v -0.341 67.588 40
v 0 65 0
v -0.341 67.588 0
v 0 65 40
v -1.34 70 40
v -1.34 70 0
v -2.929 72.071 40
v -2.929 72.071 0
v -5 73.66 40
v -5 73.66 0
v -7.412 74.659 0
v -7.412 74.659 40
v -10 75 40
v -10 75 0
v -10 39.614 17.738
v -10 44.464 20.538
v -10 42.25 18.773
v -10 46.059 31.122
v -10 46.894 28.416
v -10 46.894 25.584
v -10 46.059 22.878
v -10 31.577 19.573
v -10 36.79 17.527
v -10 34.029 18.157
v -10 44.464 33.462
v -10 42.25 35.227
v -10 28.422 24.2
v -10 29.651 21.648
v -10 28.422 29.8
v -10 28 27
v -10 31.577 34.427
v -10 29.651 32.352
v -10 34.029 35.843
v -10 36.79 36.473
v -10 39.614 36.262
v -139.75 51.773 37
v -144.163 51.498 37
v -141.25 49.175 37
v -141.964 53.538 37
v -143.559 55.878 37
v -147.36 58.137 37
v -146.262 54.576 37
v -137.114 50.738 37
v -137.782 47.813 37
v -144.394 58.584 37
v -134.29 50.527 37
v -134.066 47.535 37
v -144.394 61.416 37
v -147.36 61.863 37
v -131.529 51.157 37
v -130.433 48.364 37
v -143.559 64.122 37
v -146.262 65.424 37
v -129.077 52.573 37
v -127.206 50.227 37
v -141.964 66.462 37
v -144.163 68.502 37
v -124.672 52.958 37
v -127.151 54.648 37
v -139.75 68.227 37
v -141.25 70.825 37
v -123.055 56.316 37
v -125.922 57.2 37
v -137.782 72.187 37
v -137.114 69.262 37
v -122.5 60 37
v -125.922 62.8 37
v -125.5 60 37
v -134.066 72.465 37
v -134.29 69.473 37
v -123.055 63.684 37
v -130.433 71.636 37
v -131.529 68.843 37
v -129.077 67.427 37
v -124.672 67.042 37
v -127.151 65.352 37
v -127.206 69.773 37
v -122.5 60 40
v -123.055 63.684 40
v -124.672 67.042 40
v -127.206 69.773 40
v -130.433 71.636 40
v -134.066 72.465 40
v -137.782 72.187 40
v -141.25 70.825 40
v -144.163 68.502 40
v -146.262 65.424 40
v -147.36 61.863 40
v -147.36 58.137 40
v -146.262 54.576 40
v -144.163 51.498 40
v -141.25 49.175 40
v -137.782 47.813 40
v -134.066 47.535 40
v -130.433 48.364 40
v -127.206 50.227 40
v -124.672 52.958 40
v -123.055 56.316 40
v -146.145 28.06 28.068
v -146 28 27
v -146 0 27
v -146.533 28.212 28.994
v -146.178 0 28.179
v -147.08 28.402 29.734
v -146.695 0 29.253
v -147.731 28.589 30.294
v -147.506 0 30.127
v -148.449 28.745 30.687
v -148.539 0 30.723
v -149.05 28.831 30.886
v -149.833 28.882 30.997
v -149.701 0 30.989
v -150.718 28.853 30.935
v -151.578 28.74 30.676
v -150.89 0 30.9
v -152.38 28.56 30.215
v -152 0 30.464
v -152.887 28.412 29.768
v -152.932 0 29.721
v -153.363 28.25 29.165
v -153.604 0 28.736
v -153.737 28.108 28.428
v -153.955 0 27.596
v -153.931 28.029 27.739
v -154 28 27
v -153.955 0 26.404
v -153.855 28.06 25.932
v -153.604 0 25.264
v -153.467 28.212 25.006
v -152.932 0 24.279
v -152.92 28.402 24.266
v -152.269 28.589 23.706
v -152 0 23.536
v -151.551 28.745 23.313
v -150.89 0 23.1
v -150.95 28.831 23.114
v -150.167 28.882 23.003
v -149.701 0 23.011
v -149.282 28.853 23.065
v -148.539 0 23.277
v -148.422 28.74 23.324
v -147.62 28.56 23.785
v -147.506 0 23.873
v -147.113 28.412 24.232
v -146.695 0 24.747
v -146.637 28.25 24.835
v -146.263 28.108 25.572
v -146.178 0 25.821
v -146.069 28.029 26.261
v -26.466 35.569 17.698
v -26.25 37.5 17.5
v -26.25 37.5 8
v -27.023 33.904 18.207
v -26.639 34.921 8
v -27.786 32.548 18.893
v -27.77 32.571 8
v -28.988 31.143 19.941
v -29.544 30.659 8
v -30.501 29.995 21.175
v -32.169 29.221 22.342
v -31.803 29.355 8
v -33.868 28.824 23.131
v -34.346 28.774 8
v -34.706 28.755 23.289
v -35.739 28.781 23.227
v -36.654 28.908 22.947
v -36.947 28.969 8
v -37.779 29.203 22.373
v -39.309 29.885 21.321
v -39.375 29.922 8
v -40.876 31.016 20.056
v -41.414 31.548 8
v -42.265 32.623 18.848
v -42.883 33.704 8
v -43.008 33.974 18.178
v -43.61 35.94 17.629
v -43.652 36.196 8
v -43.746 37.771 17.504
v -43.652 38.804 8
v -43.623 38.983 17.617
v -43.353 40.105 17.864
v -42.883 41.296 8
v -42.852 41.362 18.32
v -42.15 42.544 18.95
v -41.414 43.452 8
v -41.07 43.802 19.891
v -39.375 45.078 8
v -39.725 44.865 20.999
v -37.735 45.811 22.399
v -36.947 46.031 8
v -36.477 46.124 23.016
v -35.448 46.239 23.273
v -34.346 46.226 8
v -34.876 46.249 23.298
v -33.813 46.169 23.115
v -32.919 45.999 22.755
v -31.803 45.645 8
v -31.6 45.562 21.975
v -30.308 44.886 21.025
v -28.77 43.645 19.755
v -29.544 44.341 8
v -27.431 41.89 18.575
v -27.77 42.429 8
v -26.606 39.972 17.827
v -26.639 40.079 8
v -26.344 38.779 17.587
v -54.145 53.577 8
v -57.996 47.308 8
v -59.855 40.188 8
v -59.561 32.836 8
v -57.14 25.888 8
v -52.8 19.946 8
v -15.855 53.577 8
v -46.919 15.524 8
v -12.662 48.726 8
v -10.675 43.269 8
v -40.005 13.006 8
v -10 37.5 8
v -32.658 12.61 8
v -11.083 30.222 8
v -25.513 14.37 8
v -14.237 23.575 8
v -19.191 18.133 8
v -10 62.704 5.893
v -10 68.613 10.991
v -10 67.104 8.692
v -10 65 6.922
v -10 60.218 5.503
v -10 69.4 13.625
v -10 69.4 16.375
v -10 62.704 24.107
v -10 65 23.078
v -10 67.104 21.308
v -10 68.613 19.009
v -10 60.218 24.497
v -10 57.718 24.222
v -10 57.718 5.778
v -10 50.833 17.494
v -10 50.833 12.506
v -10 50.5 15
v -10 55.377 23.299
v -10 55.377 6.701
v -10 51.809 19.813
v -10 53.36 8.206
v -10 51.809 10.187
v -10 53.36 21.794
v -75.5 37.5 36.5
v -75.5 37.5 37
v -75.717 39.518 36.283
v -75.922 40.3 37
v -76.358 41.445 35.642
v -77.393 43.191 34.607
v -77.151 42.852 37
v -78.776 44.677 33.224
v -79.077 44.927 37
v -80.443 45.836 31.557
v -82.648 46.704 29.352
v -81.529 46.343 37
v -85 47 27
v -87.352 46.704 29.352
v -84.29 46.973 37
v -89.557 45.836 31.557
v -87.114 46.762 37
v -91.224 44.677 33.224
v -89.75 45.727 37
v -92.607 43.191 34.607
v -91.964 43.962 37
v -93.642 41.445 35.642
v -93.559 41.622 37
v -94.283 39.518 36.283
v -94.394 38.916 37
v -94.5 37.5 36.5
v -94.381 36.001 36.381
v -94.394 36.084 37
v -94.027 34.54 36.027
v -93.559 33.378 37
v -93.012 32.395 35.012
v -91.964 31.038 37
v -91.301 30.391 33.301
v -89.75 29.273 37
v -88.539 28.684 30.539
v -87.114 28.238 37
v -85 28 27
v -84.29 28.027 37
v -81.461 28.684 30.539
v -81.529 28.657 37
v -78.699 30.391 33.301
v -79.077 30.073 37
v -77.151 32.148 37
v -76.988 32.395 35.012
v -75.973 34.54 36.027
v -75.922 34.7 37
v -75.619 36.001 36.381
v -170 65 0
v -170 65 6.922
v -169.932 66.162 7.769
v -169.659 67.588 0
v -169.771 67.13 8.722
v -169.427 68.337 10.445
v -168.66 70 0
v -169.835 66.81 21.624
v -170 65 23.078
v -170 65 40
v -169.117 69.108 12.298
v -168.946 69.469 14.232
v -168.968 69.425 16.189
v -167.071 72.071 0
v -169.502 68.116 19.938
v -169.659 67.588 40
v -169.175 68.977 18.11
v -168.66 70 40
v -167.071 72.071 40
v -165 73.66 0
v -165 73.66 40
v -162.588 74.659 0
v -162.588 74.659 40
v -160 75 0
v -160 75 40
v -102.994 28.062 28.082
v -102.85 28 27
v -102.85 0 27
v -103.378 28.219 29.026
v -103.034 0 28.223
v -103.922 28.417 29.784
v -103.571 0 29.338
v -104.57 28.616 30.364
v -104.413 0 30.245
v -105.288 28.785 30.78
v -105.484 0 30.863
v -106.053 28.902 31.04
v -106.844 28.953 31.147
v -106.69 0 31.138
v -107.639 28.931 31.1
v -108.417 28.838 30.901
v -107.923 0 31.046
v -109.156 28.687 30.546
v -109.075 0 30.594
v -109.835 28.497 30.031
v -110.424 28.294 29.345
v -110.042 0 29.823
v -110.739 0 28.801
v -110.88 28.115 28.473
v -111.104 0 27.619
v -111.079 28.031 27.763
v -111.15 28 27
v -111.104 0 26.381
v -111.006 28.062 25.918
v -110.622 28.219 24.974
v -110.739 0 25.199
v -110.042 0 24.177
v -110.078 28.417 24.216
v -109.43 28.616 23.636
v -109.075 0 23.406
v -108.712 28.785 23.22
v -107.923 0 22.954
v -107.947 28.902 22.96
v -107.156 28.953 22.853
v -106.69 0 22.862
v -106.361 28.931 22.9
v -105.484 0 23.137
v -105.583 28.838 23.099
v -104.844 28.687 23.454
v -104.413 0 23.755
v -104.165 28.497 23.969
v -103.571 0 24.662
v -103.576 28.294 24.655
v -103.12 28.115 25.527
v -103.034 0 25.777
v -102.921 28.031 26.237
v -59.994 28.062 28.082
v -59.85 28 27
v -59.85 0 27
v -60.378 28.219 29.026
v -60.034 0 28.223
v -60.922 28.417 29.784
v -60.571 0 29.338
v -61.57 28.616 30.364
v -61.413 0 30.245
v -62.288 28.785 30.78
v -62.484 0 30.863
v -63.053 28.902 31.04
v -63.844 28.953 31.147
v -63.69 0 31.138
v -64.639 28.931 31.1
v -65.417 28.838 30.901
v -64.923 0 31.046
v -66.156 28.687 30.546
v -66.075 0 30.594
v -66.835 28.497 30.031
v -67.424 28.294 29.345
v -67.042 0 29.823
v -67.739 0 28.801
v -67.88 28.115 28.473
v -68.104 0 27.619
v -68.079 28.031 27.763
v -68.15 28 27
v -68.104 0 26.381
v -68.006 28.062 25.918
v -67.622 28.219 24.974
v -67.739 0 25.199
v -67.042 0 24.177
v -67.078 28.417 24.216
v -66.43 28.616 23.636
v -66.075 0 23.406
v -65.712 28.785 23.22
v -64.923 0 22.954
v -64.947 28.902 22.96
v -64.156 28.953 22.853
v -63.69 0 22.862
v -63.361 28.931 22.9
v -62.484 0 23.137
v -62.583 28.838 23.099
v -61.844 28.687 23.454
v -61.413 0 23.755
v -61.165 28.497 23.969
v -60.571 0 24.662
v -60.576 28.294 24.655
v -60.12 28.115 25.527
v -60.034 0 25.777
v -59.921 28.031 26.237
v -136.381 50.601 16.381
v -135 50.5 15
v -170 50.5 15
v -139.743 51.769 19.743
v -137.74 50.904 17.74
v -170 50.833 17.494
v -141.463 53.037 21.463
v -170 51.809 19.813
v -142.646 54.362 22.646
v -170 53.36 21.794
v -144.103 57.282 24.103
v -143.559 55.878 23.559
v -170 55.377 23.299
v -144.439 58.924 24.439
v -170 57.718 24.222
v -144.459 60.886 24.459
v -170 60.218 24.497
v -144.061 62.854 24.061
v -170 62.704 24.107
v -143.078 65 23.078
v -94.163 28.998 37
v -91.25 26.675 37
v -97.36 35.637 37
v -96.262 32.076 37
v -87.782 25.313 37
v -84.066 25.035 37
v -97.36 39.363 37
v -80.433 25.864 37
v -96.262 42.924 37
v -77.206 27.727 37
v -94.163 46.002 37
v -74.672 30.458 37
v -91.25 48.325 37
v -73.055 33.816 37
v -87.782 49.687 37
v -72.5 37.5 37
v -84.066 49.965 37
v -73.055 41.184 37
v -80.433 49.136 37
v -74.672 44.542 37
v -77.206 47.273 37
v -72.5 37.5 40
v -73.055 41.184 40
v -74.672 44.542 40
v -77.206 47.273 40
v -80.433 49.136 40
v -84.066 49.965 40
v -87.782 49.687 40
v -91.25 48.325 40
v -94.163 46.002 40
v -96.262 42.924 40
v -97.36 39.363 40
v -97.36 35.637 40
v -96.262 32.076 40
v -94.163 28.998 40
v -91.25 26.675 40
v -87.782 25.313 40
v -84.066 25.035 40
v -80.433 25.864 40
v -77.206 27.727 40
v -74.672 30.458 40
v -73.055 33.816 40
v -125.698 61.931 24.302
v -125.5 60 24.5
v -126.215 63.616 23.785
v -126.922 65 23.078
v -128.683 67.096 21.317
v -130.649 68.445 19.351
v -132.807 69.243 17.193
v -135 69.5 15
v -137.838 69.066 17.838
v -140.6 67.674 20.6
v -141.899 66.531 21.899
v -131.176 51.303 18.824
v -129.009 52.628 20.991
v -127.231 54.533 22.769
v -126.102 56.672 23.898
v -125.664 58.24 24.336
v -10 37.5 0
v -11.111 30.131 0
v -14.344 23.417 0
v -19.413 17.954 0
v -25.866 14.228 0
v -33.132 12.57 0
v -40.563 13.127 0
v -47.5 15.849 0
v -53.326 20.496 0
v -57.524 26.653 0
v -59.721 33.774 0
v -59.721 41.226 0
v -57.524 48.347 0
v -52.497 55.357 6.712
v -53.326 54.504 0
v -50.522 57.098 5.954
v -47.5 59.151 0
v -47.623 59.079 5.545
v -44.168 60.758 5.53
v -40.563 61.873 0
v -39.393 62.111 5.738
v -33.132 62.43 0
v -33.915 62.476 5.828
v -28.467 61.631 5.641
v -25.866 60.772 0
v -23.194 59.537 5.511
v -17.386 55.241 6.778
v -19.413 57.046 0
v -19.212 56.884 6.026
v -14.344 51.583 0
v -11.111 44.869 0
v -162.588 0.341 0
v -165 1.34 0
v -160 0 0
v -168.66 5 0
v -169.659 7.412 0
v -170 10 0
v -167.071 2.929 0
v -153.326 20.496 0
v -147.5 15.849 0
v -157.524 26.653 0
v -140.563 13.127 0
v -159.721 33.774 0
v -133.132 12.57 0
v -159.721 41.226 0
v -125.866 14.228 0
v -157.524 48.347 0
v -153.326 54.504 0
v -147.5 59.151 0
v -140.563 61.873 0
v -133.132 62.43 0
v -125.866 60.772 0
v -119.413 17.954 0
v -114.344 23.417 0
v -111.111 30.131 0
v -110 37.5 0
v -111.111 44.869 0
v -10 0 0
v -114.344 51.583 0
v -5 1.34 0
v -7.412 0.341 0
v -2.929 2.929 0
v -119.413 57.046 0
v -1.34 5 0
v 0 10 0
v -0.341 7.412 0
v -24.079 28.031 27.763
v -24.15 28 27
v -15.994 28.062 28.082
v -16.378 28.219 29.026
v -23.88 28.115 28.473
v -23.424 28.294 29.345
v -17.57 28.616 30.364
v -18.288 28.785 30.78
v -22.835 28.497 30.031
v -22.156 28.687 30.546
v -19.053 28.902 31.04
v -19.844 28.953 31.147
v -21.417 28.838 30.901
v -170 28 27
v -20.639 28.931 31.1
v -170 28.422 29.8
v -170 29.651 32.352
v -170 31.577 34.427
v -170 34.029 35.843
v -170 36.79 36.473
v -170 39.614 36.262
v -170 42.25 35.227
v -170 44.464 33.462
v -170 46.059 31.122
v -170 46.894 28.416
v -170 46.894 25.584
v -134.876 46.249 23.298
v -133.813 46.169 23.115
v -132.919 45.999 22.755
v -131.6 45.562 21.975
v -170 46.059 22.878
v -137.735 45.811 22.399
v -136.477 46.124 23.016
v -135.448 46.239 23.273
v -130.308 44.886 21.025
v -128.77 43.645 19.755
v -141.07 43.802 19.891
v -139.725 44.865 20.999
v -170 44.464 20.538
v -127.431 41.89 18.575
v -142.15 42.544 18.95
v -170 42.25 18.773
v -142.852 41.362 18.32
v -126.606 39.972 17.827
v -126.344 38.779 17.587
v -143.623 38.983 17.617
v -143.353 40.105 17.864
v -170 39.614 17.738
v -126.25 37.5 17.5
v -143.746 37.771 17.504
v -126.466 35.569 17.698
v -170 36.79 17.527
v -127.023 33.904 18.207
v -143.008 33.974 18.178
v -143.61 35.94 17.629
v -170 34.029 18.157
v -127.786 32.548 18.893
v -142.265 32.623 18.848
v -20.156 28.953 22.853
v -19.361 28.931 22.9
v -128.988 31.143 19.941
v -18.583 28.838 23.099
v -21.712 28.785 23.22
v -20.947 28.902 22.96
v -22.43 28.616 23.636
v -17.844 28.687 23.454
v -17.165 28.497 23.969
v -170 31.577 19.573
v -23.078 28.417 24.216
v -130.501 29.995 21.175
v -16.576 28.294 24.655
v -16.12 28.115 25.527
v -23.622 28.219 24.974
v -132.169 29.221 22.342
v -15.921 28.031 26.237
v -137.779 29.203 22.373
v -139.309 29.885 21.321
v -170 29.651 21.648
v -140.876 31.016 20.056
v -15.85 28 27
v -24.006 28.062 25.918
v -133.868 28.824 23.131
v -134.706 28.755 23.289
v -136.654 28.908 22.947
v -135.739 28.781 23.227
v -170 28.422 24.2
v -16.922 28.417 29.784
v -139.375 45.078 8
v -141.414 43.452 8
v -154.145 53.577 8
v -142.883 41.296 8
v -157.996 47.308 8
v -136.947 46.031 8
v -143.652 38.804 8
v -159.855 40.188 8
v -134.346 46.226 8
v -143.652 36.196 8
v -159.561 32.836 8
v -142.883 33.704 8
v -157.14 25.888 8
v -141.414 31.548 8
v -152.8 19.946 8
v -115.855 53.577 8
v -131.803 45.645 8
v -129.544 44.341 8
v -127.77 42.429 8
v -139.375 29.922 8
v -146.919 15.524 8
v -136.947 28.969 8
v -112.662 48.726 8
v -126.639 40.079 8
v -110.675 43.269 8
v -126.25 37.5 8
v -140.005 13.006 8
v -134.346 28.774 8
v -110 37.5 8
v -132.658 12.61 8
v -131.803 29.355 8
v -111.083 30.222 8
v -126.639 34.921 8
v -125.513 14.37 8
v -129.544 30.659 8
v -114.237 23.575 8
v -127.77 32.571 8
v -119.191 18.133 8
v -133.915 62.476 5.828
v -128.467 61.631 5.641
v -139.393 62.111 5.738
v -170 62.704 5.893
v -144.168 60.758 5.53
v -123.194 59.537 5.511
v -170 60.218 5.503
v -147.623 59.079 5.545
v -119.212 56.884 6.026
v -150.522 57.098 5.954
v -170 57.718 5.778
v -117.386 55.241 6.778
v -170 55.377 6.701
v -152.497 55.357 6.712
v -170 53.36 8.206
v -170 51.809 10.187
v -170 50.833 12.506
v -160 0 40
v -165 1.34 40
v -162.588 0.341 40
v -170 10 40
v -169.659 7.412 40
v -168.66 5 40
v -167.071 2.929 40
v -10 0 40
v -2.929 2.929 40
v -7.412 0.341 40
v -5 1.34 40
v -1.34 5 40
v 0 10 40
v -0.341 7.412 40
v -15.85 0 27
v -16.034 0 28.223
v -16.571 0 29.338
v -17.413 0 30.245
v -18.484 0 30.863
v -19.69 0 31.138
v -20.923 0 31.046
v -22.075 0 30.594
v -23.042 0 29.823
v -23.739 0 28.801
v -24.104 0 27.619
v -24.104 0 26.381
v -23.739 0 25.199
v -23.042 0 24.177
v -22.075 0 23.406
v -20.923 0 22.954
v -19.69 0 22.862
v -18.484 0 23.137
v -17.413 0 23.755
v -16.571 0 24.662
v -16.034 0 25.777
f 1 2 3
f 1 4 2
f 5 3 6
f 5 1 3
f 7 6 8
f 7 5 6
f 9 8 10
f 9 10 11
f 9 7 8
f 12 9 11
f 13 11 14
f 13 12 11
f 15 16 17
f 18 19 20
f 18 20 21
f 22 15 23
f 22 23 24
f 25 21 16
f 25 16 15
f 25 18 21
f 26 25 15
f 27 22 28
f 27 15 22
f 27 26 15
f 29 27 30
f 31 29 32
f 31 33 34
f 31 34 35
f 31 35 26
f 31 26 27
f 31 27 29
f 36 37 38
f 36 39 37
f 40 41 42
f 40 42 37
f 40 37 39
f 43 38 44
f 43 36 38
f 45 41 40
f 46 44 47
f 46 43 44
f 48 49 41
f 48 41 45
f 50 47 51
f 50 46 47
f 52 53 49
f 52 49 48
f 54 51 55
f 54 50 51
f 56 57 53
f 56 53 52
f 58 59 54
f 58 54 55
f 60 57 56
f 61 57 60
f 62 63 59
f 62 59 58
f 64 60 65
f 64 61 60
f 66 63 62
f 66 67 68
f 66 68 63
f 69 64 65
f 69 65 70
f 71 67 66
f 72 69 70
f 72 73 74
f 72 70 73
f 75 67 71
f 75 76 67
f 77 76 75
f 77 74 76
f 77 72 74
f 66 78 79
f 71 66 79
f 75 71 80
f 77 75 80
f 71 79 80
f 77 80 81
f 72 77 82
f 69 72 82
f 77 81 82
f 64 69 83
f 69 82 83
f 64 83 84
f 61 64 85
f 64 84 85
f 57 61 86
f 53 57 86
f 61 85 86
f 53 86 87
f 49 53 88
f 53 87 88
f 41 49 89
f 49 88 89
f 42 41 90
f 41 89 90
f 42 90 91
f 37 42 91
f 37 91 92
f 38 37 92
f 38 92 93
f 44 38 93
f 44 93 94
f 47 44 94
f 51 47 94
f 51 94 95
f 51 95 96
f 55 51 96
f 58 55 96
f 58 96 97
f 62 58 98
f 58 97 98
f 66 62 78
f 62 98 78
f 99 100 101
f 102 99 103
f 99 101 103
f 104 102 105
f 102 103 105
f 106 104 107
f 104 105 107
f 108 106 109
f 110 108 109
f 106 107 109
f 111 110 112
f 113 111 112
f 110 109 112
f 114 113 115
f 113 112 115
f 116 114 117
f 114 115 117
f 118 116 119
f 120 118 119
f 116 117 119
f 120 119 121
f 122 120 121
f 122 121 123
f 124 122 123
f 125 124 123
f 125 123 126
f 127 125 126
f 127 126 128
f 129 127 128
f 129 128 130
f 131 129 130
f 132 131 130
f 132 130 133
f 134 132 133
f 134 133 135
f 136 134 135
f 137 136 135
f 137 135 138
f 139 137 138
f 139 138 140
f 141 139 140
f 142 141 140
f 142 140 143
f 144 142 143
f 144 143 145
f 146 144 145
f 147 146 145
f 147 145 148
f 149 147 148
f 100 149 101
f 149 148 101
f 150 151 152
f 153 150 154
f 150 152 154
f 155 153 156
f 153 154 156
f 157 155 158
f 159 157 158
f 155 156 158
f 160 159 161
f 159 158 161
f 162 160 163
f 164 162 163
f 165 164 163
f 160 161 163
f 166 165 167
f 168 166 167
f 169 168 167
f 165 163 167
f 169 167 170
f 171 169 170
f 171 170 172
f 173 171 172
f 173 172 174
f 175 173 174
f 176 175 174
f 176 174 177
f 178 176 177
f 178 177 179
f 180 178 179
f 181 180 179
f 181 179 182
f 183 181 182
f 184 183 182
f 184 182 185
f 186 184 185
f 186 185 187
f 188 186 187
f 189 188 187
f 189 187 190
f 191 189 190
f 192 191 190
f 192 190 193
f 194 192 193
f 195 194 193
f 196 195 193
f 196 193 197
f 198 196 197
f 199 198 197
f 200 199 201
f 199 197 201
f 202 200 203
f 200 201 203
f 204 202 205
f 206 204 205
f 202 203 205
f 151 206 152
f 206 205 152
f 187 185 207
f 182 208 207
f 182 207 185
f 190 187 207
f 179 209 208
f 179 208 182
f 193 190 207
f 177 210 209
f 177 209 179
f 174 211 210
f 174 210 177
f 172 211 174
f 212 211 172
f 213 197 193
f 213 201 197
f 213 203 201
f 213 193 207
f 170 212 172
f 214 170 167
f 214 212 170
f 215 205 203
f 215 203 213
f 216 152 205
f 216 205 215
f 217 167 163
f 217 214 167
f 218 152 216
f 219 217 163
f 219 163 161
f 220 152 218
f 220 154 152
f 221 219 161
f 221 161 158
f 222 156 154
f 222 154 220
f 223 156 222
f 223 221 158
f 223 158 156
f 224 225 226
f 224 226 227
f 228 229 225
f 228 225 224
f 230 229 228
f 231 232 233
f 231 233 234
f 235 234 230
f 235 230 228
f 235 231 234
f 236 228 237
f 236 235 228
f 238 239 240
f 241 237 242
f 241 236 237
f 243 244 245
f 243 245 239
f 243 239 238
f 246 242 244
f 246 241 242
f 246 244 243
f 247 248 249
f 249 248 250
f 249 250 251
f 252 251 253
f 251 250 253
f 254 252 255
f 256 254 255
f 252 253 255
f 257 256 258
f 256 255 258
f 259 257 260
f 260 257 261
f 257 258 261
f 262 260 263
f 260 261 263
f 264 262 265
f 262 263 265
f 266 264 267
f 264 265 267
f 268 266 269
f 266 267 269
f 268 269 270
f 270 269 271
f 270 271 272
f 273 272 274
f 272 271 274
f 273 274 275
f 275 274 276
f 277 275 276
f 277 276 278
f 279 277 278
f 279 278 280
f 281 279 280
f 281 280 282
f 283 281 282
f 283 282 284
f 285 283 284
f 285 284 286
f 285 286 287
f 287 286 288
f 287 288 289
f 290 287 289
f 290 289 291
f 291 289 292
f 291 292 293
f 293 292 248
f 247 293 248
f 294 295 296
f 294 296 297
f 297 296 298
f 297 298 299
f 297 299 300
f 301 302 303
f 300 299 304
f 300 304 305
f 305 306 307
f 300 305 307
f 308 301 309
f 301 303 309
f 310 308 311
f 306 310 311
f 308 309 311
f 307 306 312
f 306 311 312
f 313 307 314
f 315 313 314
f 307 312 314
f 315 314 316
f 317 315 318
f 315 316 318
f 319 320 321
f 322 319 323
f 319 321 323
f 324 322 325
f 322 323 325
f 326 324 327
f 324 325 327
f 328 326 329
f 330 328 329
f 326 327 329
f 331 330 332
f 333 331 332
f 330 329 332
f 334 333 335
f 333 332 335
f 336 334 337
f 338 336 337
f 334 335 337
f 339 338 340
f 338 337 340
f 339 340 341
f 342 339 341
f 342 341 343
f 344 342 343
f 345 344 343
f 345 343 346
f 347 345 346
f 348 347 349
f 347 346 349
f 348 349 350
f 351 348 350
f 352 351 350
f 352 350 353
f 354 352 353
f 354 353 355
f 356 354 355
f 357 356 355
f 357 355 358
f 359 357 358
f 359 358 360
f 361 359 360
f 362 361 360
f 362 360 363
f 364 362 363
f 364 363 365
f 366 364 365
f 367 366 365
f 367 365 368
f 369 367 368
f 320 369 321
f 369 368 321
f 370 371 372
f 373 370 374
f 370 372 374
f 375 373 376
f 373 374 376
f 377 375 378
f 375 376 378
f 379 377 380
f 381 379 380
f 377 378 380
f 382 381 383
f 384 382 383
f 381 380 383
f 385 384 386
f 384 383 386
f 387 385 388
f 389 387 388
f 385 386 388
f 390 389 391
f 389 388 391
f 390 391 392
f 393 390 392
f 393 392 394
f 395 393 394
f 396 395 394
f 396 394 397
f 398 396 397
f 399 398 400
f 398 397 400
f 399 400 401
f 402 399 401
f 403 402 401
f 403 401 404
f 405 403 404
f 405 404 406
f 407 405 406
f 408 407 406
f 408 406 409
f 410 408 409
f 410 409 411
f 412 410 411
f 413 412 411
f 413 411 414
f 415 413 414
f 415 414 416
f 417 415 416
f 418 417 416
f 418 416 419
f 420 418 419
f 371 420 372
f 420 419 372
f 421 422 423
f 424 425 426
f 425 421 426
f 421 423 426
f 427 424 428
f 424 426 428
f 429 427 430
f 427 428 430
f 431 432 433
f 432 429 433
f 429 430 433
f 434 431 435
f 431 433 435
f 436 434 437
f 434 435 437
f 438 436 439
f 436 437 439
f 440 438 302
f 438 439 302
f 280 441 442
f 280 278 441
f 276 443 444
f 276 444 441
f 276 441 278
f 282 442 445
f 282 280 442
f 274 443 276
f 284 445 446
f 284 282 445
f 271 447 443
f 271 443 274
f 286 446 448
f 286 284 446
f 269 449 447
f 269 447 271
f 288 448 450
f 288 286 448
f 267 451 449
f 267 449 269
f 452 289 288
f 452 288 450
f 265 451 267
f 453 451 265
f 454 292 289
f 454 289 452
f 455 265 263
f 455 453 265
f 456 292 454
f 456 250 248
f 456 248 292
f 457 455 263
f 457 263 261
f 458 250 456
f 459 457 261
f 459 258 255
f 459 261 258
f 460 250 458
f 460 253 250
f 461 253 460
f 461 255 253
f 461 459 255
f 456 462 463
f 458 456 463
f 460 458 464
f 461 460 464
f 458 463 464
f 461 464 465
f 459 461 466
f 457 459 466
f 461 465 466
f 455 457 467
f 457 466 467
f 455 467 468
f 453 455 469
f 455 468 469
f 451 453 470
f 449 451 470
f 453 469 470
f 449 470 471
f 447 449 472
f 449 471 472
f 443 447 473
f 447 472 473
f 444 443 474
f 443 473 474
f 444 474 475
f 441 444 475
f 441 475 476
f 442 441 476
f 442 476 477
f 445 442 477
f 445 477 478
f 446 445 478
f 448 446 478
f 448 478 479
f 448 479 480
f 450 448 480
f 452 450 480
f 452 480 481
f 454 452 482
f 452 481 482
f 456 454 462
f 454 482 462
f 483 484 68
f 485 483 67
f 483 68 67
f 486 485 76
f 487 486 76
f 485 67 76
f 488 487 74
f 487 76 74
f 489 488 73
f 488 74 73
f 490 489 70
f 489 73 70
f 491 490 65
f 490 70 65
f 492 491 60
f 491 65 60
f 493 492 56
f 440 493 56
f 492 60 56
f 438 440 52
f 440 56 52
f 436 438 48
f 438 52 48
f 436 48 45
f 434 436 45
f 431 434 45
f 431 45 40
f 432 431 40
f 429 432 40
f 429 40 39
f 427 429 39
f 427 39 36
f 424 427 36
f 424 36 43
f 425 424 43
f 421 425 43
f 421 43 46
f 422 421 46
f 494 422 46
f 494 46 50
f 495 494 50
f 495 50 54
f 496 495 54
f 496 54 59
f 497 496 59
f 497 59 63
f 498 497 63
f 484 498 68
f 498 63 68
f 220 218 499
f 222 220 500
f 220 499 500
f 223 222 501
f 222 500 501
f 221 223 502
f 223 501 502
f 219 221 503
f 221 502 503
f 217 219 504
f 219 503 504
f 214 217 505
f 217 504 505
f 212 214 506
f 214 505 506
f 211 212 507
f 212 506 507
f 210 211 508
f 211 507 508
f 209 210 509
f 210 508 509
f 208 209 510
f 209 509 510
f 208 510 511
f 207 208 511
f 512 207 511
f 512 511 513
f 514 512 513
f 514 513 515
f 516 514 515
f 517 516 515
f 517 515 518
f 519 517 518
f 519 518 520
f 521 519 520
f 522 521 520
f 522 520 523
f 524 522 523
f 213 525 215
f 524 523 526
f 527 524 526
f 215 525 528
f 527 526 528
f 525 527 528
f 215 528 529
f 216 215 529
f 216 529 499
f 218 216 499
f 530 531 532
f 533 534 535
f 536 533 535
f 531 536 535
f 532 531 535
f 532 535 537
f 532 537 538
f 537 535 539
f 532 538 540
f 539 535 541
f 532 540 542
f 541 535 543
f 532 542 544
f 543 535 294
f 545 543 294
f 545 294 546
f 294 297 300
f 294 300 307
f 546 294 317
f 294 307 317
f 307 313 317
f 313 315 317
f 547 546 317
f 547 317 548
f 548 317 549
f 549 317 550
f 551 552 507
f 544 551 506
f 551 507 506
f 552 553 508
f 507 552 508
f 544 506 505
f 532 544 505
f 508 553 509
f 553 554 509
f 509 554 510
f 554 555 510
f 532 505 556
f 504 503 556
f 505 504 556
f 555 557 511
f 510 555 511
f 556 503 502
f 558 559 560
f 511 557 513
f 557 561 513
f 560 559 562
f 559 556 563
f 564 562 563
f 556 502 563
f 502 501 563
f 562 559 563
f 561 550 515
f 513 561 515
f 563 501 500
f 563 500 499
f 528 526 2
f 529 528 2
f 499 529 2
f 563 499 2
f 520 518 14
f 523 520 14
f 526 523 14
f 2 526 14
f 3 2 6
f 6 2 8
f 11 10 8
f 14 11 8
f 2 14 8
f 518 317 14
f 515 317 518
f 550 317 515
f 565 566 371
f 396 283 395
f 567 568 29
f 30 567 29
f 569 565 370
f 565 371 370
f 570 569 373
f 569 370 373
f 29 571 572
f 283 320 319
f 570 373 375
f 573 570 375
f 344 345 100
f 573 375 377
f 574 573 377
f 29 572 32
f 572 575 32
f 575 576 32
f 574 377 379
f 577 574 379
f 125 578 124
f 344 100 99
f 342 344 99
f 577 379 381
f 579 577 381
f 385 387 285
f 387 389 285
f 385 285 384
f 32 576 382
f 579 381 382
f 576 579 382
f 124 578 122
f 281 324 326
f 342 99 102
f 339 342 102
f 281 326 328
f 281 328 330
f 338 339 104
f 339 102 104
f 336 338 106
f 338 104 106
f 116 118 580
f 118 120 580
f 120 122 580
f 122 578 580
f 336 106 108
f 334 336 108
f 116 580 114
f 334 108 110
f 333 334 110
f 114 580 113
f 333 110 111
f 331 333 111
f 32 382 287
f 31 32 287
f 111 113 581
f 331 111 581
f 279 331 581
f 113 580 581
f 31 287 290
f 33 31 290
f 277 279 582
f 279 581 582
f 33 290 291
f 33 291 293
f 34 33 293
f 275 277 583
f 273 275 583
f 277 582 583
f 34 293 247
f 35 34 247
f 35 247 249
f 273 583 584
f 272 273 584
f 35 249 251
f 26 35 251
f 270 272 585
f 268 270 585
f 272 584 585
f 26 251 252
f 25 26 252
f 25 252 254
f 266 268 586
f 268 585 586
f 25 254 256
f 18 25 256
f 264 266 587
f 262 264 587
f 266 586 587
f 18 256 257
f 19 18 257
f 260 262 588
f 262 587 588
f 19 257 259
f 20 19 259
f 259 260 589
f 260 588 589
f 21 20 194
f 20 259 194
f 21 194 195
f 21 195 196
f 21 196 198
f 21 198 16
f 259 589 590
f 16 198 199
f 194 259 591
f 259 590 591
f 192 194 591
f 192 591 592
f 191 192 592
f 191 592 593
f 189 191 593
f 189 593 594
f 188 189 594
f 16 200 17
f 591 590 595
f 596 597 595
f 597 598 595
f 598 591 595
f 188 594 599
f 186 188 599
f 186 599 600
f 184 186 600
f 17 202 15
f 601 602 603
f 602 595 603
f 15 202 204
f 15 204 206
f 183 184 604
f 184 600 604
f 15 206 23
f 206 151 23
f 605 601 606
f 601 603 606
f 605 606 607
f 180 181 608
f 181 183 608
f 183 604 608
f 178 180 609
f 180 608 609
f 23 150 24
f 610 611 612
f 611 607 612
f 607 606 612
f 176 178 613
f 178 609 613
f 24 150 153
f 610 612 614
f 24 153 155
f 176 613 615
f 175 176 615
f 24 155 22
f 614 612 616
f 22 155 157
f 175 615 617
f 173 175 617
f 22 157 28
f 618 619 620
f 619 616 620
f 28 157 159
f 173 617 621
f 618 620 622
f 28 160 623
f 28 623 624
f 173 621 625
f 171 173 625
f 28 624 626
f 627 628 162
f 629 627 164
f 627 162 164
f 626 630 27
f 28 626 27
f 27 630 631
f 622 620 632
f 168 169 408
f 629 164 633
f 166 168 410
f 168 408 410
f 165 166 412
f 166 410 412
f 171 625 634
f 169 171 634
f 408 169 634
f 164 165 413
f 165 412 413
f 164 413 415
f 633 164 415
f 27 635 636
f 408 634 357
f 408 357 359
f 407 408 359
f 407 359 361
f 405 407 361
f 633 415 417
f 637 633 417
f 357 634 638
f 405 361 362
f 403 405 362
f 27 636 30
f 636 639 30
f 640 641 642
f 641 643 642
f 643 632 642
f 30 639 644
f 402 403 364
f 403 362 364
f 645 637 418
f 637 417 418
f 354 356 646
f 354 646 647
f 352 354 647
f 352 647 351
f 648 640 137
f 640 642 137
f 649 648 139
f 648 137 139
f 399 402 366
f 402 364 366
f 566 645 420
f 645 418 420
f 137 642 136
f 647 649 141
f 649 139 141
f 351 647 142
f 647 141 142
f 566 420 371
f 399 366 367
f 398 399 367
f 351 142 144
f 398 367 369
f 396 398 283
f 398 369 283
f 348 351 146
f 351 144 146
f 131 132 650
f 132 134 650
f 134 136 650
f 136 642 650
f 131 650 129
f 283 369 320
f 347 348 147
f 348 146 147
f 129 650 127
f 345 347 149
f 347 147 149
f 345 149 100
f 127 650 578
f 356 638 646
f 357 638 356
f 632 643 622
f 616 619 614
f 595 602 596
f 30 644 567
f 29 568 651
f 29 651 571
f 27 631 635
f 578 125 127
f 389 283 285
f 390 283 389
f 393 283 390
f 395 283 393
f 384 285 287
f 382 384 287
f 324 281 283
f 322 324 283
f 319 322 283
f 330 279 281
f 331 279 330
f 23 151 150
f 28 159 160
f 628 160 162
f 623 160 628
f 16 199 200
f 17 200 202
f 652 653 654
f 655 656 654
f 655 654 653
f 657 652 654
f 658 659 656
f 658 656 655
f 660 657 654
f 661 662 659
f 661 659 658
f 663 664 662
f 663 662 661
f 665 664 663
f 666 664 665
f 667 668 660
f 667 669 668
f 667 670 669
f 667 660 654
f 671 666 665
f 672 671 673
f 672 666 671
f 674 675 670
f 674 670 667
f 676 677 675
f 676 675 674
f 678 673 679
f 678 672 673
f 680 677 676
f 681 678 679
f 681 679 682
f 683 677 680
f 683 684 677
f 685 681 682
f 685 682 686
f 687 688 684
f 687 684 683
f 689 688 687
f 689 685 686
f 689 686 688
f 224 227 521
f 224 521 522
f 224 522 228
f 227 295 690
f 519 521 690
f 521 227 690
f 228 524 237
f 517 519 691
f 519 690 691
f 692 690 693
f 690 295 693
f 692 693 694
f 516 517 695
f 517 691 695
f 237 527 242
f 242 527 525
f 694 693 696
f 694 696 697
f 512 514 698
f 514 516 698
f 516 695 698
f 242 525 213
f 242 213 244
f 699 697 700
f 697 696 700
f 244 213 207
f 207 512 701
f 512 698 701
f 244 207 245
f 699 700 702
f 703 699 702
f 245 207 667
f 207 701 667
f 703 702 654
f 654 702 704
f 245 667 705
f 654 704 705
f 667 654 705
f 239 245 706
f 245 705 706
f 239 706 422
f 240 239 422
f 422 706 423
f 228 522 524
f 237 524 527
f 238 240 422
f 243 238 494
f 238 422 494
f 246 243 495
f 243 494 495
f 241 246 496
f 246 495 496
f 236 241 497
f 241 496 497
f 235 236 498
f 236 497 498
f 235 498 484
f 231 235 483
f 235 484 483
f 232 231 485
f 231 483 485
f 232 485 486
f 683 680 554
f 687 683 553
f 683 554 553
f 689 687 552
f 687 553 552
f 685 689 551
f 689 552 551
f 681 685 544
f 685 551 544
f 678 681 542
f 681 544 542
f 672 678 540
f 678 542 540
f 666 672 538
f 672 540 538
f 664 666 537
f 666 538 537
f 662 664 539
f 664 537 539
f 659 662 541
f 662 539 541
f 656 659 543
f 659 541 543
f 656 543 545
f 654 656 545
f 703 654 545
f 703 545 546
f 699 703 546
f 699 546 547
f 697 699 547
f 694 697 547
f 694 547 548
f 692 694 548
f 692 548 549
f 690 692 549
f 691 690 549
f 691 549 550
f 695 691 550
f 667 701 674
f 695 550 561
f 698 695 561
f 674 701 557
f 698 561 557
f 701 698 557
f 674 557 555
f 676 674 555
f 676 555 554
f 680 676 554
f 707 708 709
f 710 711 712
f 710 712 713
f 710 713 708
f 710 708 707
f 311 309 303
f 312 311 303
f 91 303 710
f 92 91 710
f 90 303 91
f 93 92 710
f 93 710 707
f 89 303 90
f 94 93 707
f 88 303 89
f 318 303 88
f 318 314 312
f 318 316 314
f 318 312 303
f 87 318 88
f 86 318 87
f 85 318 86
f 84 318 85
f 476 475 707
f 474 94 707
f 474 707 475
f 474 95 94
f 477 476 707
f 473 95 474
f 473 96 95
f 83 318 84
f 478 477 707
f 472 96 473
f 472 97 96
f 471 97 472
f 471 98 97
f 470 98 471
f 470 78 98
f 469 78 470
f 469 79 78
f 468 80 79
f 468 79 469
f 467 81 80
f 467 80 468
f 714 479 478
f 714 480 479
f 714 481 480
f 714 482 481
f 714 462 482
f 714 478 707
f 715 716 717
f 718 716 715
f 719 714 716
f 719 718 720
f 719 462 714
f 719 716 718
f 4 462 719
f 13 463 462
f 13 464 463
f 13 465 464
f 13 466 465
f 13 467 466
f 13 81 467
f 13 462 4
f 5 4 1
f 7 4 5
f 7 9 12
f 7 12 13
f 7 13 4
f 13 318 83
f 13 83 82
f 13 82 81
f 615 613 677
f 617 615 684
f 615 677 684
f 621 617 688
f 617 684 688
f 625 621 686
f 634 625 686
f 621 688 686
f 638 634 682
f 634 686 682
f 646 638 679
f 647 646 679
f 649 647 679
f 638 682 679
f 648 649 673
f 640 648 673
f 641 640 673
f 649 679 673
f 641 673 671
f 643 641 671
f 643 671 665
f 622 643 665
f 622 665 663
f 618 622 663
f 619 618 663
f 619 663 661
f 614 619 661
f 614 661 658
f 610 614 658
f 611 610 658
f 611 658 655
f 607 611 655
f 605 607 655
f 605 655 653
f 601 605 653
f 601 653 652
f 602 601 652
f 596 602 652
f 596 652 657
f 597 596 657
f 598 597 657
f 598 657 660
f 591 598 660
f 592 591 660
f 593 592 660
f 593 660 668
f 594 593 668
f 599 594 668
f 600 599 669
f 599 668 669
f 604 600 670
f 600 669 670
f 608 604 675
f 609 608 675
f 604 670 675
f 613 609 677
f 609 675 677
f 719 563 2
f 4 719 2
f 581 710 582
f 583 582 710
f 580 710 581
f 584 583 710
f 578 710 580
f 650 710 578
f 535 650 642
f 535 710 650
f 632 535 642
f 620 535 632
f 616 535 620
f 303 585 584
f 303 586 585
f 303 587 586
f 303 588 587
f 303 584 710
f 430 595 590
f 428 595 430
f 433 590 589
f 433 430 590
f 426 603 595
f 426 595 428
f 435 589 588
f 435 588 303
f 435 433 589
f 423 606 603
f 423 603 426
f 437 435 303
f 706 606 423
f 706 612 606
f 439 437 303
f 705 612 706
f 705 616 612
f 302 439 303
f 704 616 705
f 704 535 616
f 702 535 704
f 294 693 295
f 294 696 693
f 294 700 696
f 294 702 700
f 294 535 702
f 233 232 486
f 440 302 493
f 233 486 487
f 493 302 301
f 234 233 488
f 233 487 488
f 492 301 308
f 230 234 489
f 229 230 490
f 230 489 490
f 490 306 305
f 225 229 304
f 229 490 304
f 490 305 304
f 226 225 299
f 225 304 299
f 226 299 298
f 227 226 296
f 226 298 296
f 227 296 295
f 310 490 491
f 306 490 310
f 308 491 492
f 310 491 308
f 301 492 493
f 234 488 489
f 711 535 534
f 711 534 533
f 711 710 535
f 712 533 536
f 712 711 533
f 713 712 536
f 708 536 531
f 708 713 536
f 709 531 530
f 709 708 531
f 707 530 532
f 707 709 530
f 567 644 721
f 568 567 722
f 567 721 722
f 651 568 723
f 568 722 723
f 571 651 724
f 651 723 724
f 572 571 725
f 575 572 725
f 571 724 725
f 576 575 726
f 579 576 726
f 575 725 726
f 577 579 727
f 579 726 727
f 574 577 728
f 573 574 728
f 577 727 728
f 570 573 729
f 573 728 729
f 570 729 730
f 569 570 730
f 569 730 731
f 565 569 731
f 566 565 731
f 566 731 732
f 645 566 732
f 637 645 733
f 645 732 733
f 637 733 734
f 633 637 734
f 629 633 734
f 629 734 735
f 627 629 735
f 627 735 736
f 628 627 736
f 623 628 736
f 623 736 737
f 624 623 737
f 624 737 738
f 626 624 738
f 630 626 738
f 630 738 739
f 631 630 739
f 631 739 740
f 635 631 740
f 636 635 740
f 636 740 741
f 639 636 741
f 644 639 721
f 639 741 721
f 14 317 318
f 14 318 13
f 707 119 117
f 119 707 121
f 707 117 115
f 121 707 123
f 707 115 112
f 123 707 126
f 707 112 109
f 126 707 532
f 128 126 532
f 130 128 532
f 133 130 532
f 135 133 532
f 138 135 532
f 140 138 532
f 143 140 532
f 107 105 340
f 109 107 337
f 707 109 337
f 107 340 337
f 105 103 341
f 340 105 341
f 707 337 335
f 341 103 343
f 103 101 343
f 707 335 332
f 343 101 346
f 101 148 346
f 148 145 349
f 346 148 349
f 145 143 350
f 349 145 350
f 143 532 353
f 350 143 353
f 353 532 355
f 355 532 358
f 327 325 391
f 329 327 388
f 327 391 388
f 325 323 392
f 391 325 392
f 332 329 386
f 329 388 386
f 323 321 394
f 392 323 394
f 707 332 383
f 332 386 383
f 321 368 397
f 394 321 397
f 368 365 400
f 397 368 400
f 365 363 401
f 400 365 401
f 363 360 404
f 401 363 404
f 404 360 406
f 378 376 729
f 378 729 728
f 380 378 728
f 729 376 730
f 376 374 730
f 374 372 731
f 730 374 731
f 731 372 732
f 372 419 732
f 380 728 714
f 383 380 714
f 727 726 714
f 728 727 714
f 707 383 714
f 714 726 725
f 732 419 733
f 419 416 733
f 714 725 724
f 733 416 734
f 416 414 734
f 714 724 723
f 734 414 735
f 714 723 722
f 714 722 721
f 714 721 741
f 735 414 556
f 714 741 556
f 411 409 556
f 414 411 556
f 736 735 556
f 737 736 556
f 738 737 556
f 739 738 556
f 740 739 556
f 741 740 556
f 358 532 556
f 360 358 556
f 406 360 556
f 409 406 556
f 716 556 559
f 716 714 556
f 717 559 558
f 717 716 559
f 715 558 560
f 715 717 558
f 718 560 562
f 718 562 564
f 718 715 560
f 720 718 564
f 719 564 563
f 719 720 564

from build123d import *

# Parameters (mm, degrees)
F0_W      = 170
F0_H      = 75
F1_DEPTH  = 40
F2_R      = 10
F3_R      = 25
F3_R_2    = 8.75
F6_DEPTH  = 8
F7_DEPTH  = 27
F4_R      = 9.5
F8_DEPTH  = 160
F5_R      = 12.5
F5_R_2    = 9.5
F9_DEPTH  = 3
F10_DEPTH = 13
F11_DEPTH = 25
F12_R     = 4
F12_R_2   = 4.15
F13_DEPTH = 35


with BuildPart() as f1:
    # F0 (on Top) → F1 (new body)
    with BuildSketch(Plane.XY):
        with Locations((-85, 37.5)):
            Rectangle(F0_W, F0_H)
    extrude(amount=F1_DEPTH)

    # F2
    f2_edges = [f1.edges().sort_by_distance(p)[0] for p in [
        (0, 0, 20),
        (0, 75, 20),
        (-170, 0, 20),
        (-170, 75, 20),
    ]]
    fillet(f2_edges, radius=F2_R)

    # F3 (on face) → F6 (cut)
    with BuildSketch(Plane(origin=(0, 0, 0), x_dir=(1, 0, 0), z_dir=(0, 0, -1))):
        with Locations((-135, -37.5)):
            Circle(F3_R)
        with Locations((-135, -37.5)):
            Circle(F3_R_2, mode=Mode.SUBTRACT)
        with Locations((-35, -37.5)):
            Circle(F3_R)
        with Locations((-35, -37.5)):
            Circle(F3_R_2, mode=Mode.SUBTRACT)
    extrude(amount=-F6_DEPTH, mode=Mode.SUBTRACT)

    # F7 (cut): faces of the model
    f7_faces = [f1.faces().sort_by_distance(p)[0] for p in [
        (-135, 37.5, 0),
        (-35, 37.5, 0),
    ]]
    extrude(f7_faces, amount=-F7_DEPTH, mode=Mode.SUBTRACT)

    # F4 (on face) → F8 (cut)
    with BuildSketch(Plane(origin=(-170, 0, 0), x_dir=(0, -1, 0), z_dir=(-1, 0, 0))):
        with Locations((-37.5, 27)):
            Circle(F4_R)
        with BuildLine():
            ThreePointArc((-65, 6.9222527893), (-55.3766894978, 6.7009036637), (-50.5, 15))
            ThreePointArc((-50.5, 15), (-55.3766894978, 23.2990963363), (-65, 23.0777472107))
            Line((-65, 23.0777472107), (-65, 6.9222527893))
        make_face()
        with BuildLine():
            Line((-65, 6.9222527893), (-65, 23.0777472107))
            ThreePointArc((-65, 23.0777472107), (-69.5, 15), (-65, 6.9222527893))
        make_face()
    extrude(amount=-F8_DEPTH, mode=Mode.SUBTRACT)

    # F5 (on face) → F9 (cut)
    with BuildSketch(Plane.XY.offset(40)):
        with Locations((-135, 60)):
            Circle(F5_R)
        with Locations((-135, 60)):
            Circle(F5_R_2, mode=Mode.SUBTRACT)
        with Locations((-85, 37.5)):
            Circle(F5_R)
        with Locations((-85, 37.5)):
            Circle(F5_R_2, mode=Mode.SUBTRACT)
    extrude(amount=-F9_DEPTH, mode=Mode.SUBTRACT)

    # F10 (cut): a face of the model
    f10_faces = [f1.faces().sort_by_distance(p)[0] for p in [
        (-85, 37.5, 40),
    ]]
    extrude(f10_faces, amount=-F10_DEPTH, mode=Mode.SUBTRACT)

    # F11 (cut): a face of the model
    f11_faces = [f1.faces().sort_by_distance(p)[0] for p in [
        (-135, 60, 40),
    ]]
    extrude(f11_faces, amount=-F11_DEPTH, mode=Mode.SUBTRACT)

    # F12 (on face) → F13 (cut)
    with BuildSketch(Plane.XZ):
        with Locations((-150, 27)):
            Circle(F12_R)
        with Locations((-107, 27)):
            Circle(F12_R_2)
        with Locations((-64, 27)):
            Circle(F12_R_2)
        with Locations((-20, 27)):
            Circle(F12_R_2)
    extrude(amount=-F13_DEPTH, mode=Mode.SUBTRACT)


solid = f1.part
